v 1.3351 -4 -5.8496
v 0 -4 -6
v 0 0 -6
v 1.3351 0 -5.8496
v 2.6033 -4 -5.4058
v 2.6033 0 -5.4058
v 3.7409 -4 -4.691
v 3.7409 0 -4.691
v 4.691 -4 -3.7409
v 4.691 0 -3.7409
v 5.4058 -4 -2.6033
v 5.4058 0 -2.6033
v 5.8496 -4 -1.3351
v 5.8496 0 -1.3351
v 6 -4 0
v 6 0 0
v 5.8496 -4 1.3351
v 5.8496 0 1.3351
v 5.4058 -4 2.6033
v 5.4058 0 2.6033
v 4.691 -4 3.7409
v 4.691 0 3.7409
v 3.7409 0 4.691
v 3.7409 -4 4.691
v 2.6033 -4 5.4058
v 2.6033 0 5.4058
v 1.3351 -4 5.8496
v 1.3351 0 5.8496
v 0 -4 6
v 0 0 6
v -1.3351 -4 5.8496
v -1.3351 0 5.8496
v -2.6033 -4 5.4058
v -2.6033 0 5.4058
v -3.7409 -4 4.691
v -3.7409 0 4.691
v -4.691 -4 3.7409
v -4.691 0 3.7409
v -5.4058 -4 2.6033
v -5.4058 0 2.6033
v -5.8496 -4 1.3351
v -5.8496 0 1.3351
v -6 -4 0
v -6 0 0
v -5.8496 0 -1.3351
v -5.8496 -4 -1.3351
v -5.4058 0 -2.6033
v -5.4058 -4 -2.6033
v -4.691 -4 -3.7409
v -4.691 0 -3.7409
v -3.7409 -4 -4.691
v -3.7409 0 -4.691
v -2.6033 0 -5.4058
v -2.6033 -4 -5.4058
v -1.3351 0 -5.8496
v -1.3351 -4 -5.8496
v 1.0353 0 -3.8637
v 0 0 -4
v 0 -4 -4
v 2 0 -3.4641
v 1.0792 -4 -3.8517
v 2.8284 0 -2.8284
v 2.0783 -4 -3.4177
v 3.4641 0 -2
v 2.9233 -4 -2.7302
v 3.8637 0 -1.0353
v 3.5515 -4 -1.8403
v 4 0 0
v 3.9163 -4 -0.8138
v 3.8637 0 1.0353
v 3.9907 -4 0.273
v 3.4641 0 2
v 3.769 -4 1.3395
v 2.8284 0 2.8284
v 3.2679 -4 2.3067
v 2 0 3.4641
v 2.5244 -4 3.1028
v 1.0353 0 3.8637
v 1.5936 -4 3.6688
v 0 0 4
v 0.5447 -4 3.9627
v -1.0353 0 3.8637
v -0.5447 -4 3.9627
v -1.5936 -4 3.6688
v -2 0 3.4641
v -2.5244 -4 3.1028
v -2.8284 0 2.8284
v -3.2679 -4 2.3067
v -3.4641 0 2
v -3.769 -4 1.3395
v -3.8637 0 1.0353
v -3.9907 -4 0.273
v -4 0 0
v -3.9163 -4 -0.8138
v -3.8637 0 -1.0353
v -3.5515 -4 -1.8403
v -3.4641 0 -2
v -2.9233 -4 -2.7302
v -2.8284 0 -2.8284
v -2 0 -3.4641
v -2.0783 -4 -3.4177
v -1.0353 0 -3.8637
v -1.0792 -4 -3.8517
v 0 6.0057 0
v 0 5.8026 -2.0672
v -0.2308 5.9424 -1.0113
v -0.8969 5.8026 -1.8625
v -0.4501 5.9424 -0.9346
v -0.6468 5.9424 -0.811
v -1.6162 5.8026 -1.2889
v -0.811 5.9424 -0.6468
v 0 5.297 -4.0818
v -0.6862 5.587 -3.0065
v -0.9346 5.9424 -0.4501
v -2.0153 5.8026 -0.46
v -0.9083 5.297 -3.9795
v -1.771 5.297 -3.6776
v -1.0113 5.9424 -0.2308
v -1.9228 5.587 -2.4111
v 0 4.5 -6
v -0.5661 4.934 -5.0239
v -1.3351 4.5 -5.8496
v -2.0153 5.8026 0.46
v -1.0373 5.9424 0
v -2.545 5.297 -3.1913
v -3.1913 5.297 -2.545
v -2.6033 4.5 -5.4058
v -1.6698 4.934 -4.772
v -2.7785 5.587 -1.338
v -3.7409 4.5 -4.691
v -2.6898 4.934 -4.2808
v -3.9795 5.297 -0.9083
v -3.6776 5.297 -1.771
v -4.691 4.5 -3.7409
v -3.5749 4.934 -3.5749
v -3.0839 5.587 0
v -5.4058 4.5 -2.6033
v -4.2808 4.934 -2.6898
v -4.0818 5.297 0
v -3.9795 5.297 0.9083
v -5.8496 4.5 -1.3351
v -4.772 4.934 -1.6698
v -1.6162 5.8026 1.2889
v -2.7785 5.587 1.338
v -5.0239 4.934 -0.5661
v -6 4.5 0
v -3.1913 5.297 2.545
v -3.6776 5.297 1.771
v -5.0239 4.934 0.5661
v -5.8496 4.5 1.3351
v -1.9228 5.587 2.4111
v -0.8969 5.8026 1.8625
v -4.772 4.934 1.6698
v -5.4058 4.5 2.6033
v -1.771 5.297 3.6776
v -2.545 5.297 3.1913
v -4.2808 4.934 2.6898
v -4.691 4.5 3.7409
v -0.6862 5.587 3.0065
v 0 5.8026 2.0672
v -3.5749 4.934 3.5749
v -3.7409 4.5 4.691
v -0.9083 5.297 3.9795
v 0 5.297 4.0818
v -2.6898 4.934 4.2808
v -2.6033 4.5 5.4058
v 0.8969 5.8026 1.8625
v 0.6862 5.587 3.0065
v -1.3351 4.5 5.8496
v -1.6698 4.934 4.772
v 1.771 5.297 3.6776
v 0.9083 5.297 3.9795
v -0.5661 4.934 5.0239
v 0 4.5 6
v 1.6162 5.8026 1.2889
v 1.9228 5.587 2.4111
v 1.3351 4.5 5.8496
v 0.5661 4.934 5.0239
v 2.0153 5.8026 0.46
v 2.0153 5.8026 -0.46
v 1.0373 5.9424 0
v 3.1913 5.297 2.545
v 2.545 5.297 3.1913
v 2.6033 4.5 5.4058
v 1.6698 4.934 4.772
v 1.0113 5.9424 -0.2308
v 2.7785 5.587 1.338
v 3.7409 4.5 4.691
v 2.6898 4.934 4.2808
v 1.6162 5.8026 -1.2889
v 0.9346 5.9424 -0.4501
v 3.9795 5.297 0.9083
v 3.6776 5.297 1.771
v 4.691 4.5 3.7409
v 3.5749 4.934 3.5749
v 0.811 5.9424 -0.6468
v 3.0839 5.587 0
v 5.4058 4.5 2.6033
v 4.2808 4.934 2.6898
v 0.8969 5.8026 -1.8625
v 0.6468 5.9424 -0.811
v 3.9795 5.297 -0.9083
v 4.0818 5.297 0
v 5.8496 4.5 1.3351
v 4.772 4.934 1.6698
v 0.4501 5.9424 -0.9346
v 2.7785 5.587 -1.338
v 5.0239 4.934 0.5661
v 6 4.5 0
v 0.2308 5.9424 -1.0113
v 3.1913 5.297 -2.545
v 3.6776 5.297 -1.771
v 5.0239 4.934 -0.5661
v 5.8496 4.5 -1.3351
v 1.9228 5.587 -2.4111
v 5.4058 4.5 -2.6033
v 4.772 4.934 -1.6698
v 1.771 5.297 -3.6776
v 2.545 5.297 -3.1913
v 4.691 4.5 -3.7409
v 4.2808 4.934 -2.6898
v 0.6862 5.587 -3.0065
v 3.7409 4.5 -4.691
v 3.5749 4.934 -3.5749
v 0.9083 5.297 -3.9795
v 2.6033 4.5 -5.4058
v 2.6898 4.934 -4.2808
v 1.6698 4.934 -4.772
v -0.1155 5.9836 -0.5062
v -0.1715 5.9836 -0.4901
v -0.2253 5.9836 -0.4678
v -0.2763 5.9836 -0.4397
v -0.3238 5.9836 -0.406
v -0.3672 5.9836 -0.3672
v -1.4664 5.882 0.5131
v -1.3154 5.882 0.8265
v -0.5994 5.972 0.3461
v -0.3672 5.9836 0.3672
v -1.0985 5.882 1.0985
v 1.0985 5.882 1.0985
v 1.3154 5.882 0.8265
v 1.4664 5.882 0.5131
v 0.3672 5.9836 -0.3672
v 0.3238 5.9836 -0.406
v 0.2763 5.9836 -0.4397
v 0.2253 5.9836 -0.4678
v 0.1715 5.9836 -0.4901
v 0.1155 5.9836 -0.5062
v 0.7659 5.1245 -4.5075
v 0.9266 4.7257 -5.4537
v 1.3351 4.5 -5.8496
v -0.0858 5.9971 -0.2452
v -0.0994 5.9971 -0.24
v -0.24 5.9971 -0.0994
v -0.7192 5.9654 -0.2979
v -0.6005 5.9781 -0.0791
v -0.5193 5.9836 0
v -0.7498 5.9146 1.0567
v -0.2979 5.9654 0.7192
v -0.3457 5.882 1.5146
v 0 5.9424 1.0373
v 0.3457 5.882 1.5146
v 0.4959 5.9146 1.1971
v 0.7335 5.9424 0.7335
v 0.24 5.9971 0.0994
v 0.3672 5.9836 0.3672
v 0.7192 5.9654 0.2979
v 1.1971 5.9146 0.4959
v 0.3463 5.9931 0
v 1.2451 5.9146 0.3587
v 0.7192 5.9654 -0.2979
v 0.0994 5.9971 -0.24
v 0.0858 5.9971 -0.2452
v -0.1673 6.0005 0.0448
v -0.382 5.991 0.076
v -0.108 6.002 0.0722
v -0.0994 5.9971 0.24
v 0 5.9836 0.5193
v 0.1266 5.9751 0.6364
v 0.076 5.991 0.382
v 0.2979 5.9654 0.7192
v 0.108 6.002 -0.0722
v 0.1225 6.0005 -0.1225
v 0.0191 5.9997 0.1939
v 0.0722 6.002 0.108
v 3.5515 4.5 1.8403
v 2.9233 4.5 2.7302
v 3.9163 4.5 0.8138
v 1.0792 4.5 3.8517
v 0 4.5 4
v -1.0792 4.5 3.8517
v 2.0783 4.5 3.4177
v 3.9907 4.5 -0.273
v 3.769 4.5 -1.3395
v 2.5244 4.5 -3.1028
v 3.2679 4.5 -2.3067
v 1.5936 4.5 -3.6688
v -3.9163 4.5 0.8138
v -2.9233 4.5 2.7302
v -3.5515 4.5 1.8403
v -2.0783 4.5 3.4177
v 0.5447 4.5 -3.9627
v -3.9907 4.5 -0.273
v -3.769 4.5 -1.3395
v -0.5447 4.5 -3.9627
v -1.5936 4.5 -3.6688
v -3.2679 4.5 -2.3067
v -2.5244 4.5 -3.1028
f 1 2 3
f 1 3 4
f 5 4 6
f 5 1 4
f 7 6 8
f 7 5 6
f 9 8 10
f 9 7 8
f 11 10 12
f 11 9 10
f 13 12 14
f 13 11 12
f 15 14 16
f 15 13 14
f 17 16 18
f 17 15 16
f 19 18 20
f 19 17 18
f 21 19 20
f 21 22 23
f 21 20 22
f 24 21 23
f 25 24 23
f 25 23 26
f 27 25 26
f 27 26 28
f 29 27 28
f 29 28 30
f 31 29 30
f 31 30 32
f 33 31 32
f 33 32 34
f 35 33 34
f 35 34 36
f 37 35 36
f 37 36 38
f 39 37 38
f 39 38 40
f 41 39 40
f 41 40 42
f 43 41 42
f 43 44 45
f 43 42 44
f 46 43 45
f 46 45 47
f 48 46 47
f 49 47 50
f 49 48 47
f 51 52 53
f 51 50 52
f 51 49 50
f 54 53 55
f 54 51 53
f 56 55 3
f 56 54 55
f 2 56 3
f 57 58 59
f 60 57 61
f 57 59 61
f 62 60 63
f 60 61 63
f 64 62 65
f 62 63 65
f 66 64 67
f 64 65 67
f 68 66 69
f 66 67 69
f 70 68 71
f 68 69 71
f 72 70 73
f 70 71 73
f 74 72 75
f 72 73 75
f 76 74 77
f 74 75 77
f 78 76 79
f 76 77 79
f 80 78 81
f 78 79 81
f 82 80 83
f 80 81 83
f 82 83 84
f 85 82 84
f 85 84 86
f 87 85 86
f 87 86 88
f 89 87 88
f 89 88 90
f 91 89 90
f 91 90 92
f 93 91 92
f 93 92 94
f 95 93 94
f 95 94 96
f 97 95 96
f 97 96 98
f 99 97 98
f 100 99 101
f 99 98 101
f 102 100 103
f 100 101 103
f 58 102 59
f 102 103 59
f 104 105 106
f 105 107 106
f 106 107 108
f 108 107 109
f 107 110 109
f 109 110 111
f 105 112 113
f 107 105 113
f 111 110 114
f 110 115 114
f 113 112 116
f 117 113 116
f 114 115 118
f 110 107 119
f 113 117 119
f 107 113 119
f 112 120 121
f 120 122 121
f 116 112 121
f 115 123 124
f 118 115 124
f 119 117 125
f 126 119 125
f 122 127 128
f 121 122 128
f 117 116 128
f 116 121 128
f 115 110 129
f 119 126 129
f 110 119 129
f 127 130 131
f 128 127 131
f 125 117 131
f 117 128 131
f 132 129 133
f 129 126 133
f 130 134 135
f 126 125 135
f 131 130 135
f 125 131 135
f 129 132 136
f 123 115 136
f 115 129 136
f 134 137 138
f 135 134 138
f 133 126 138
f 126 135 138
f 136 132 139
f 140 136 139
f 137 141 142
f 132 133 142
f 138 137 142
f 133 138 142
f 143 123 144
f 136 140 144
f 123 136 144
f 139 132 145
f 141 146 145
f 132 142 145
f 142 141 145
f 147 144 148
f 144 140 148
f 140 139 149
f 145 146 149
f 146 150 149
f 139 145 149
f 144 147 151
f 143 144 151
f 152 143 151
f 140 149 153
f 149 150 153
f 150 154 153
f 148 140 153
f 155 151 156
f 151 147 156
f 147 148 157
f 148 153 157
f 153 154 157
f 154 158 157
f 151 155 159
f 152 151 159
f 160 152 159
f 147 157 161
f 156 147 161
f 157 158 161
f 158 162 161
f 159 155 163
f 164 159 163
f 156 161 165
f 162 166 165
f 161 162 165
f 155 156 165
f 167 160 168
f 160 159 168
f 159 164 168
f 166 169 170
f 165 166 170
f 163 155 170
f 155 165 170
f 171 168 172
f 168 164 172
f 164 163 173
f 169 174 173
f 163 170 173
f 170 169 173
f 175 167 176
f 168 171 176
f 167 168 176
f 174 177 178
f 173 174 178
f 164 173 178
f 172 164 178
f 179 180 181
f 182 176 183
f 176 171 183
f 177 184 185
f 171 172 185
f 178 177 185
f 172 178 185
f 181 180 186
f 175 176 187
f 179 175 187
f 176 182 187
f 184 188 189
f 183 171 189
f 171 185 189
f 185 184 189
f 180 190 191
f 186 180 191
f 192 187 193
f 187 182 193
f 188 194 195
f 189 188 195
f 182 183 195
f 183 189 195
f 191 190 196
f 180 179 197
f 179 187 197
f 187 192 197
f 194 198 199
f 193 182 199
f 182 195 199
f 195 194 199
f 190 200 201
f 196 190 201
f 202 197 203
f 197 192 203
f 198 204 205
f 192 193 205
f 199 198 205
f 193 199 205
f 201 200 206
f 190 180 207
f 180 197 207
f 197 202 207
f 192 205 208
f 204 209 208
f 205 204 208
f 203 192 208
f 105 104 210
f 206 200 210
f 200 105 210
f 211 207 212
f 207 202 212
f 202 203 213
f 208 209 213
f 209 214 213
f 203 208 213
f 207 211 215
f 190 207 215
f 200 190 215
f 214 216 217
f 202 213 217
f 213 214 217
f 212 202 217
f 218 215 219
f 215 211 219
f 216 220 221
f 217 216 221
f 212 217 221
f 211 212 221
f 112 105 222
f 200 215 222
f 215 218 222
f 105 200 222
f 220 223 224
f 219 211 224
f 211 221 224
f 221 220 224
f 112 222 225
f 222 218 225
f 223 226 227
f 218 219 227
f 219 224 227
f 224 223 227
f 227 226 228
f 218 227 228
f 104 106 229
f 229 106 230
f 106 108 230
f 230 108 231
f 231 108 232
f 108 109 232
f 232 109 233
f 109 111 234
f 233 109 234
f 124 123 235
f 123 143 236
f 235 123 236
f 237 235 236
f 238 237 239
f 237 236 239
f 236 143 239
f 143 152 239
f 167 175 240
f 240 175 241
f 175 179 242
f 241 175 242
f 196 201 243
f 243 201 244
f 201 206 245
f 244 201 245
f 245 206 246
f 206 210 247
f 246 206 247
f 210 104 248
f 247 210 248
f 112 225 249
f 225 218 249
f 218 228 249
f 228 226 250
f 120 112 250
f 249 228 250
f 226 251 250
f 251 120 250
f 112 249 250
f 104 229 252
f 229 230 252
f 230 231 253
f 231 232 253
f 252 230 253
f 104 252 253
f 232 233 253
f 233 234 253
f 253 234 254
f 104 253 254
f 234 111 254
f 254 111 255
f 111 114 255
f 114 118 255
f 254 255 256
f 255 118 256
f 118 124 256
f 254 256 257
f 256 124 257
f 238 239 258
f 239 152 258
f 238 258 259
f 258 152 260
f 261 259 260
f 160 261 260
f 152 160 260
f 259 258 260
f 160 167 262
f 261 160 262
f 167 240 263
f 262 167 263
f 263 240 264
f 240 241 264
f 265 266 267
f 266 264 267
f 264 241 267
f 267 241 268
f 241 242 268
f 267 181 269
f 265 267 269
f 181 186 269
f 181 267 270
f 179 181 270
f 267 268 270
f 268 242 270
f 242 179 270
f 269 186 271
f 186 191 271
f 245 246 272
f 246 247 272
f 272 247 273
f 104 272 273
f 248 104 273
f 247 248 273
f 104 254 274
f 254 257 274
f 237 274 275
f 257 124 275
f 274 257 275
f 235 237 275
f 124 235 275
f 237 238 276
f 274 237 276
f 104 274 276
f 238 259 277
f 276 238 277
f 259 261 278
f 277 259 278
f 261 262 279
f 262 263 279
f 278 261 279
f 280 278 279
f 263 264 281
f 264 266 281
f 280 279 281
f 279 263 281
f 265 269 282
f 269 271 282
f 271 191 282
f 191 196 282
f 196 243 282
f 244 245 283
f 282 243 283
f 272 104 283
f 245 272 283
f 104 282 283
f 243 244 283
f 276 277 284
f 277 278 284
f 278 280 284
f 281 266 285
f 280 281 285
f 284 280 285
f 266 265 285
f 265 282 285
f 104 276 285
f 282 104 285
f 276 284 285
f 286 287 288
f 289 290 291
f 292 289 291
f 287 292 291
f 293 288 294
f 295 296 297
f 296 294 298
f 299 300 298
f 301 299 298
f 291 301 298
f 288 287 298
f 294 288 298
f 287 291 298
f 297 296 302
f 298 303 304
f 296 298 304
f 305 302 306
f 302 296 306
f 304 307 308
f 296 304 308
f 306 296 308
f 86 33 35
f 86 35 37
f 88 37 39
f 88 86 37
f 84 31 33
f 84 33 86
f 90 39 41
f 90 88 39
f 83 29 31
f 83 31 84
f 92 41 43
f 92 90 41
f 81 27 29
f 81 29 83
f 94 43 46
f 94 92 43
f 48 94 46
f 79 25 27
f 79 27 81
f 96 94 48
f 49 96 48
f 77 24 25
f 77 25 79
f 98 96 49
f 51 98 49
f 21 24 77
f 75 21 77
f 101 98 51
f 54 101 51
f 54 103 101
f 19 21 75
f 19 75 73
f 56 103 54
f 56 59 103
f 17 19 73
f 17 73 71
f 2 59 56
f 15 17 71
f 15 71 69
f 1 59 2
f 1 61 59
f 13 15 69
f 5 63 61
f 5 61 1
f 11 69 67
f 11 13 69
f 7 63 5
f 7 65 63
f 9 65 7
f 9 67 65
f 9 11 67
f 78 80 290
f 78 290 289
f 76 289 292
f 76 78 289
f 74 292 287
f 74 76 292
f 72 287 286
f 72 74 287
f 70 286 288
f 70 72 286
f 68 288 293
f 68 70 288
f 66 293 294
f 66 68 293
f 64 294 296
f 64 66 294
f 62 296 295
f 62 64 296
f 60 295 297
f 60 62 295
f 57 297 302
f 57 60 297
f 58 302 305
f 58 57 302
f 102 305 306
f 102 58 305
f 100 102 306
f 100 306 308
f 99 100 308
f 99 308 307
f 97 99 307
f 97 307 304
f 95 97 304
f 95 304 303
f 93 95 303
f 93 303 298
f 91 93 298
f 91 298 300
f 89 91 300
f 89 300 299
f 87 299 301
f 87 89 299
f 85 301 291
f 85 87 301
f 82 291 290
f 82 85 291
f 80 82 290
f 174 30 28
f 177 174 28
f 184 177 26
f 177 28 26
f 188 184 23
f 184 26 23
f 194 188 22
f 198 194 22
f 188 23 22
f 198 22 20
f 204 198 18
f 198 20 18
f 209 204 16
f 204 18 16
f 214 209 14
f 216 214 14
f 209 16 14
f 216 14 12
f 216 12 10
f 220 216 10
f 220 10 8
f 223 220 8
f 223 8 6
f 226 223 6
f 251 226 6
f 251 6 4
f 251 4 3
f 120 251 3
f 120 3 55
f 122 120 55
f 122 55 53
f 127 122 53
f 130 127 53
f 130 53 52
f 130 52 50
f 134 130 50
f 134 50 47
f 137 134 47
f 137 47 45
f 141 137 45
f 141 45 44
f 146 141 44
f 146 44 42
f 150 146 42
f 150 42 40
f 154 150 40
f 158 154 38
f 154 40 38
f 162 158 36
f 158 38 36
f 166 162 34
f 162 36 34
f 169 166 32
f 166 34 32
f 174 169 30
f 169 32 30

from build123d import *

# Parameters (mm, degrees)
IZIM1_R                     = 6
IZIM1_R_2                   = 4
Y_KSEKLIK_EKSTR_ZYON1_DEPTH = 4.5
BOSS_EXTRUDE1_START         = 4
SKETCH1_R                   = 6
SKETCH1_R_2                 = 4
BOSS_EXTRUDE1_DEPTH         = 4


with BuildPart() as part:
    # Çizim1 → Yükseklik-Ekstrüzyon1 (new body)
    with BuildSketch(Plane(origin=(0, 0, 0), x_dir=(1, 0, 0), z_dir=(0, 1, 0))):
        with Locations(Location((0, 0, 0), (0, 0, 270))):
            Circle(IZIM1_R)
        with Locations(Location((0, 0, 0), (0, 0, 270))):
            Circle(IZIM1_R_2, mode=Mode.SUBTRACT)
    extrude(amount=Y_KSEKLIK_EKSTR_ZYON1_DEPTH)

    # Çizim2 → Döndür1 (revolve)
    with BuildSketch(Plane(origin=(0, 0, 0), x_dir=(0, 0, -1), z_dir=(1, 0, 0))):
        with BuildLine():
            Line((0, 4.5), (0, 6.005722605))
            ThreePointArc((0, 6.005722605), (3.083863381, 5.587039913), (6, 4.5))
            Line((6, 4.5), (0, 4.5))
        make_face()
    revolve(axis=Axis((0, 4.5, 0), (0, 1, 0)))

    # Sketch1 → Boss-Extrude1 (add)
    with BuildSketch(Plane.XZ.offset(BOSS_EXTRUDE1_START)):
        with Locations(Location((0, 0, 0), (0, 0, 270))):
            Circle(SKETCH1_R)
        with Locations(Location((0, 0, 0), (0, 0, 270))):
            Circle(SKETCH1_R_2, mode=Mode.SUBTRACT)
    extrude(amount=-BOSS_EXTRUDE1_DEPTH)


solid = part.part
